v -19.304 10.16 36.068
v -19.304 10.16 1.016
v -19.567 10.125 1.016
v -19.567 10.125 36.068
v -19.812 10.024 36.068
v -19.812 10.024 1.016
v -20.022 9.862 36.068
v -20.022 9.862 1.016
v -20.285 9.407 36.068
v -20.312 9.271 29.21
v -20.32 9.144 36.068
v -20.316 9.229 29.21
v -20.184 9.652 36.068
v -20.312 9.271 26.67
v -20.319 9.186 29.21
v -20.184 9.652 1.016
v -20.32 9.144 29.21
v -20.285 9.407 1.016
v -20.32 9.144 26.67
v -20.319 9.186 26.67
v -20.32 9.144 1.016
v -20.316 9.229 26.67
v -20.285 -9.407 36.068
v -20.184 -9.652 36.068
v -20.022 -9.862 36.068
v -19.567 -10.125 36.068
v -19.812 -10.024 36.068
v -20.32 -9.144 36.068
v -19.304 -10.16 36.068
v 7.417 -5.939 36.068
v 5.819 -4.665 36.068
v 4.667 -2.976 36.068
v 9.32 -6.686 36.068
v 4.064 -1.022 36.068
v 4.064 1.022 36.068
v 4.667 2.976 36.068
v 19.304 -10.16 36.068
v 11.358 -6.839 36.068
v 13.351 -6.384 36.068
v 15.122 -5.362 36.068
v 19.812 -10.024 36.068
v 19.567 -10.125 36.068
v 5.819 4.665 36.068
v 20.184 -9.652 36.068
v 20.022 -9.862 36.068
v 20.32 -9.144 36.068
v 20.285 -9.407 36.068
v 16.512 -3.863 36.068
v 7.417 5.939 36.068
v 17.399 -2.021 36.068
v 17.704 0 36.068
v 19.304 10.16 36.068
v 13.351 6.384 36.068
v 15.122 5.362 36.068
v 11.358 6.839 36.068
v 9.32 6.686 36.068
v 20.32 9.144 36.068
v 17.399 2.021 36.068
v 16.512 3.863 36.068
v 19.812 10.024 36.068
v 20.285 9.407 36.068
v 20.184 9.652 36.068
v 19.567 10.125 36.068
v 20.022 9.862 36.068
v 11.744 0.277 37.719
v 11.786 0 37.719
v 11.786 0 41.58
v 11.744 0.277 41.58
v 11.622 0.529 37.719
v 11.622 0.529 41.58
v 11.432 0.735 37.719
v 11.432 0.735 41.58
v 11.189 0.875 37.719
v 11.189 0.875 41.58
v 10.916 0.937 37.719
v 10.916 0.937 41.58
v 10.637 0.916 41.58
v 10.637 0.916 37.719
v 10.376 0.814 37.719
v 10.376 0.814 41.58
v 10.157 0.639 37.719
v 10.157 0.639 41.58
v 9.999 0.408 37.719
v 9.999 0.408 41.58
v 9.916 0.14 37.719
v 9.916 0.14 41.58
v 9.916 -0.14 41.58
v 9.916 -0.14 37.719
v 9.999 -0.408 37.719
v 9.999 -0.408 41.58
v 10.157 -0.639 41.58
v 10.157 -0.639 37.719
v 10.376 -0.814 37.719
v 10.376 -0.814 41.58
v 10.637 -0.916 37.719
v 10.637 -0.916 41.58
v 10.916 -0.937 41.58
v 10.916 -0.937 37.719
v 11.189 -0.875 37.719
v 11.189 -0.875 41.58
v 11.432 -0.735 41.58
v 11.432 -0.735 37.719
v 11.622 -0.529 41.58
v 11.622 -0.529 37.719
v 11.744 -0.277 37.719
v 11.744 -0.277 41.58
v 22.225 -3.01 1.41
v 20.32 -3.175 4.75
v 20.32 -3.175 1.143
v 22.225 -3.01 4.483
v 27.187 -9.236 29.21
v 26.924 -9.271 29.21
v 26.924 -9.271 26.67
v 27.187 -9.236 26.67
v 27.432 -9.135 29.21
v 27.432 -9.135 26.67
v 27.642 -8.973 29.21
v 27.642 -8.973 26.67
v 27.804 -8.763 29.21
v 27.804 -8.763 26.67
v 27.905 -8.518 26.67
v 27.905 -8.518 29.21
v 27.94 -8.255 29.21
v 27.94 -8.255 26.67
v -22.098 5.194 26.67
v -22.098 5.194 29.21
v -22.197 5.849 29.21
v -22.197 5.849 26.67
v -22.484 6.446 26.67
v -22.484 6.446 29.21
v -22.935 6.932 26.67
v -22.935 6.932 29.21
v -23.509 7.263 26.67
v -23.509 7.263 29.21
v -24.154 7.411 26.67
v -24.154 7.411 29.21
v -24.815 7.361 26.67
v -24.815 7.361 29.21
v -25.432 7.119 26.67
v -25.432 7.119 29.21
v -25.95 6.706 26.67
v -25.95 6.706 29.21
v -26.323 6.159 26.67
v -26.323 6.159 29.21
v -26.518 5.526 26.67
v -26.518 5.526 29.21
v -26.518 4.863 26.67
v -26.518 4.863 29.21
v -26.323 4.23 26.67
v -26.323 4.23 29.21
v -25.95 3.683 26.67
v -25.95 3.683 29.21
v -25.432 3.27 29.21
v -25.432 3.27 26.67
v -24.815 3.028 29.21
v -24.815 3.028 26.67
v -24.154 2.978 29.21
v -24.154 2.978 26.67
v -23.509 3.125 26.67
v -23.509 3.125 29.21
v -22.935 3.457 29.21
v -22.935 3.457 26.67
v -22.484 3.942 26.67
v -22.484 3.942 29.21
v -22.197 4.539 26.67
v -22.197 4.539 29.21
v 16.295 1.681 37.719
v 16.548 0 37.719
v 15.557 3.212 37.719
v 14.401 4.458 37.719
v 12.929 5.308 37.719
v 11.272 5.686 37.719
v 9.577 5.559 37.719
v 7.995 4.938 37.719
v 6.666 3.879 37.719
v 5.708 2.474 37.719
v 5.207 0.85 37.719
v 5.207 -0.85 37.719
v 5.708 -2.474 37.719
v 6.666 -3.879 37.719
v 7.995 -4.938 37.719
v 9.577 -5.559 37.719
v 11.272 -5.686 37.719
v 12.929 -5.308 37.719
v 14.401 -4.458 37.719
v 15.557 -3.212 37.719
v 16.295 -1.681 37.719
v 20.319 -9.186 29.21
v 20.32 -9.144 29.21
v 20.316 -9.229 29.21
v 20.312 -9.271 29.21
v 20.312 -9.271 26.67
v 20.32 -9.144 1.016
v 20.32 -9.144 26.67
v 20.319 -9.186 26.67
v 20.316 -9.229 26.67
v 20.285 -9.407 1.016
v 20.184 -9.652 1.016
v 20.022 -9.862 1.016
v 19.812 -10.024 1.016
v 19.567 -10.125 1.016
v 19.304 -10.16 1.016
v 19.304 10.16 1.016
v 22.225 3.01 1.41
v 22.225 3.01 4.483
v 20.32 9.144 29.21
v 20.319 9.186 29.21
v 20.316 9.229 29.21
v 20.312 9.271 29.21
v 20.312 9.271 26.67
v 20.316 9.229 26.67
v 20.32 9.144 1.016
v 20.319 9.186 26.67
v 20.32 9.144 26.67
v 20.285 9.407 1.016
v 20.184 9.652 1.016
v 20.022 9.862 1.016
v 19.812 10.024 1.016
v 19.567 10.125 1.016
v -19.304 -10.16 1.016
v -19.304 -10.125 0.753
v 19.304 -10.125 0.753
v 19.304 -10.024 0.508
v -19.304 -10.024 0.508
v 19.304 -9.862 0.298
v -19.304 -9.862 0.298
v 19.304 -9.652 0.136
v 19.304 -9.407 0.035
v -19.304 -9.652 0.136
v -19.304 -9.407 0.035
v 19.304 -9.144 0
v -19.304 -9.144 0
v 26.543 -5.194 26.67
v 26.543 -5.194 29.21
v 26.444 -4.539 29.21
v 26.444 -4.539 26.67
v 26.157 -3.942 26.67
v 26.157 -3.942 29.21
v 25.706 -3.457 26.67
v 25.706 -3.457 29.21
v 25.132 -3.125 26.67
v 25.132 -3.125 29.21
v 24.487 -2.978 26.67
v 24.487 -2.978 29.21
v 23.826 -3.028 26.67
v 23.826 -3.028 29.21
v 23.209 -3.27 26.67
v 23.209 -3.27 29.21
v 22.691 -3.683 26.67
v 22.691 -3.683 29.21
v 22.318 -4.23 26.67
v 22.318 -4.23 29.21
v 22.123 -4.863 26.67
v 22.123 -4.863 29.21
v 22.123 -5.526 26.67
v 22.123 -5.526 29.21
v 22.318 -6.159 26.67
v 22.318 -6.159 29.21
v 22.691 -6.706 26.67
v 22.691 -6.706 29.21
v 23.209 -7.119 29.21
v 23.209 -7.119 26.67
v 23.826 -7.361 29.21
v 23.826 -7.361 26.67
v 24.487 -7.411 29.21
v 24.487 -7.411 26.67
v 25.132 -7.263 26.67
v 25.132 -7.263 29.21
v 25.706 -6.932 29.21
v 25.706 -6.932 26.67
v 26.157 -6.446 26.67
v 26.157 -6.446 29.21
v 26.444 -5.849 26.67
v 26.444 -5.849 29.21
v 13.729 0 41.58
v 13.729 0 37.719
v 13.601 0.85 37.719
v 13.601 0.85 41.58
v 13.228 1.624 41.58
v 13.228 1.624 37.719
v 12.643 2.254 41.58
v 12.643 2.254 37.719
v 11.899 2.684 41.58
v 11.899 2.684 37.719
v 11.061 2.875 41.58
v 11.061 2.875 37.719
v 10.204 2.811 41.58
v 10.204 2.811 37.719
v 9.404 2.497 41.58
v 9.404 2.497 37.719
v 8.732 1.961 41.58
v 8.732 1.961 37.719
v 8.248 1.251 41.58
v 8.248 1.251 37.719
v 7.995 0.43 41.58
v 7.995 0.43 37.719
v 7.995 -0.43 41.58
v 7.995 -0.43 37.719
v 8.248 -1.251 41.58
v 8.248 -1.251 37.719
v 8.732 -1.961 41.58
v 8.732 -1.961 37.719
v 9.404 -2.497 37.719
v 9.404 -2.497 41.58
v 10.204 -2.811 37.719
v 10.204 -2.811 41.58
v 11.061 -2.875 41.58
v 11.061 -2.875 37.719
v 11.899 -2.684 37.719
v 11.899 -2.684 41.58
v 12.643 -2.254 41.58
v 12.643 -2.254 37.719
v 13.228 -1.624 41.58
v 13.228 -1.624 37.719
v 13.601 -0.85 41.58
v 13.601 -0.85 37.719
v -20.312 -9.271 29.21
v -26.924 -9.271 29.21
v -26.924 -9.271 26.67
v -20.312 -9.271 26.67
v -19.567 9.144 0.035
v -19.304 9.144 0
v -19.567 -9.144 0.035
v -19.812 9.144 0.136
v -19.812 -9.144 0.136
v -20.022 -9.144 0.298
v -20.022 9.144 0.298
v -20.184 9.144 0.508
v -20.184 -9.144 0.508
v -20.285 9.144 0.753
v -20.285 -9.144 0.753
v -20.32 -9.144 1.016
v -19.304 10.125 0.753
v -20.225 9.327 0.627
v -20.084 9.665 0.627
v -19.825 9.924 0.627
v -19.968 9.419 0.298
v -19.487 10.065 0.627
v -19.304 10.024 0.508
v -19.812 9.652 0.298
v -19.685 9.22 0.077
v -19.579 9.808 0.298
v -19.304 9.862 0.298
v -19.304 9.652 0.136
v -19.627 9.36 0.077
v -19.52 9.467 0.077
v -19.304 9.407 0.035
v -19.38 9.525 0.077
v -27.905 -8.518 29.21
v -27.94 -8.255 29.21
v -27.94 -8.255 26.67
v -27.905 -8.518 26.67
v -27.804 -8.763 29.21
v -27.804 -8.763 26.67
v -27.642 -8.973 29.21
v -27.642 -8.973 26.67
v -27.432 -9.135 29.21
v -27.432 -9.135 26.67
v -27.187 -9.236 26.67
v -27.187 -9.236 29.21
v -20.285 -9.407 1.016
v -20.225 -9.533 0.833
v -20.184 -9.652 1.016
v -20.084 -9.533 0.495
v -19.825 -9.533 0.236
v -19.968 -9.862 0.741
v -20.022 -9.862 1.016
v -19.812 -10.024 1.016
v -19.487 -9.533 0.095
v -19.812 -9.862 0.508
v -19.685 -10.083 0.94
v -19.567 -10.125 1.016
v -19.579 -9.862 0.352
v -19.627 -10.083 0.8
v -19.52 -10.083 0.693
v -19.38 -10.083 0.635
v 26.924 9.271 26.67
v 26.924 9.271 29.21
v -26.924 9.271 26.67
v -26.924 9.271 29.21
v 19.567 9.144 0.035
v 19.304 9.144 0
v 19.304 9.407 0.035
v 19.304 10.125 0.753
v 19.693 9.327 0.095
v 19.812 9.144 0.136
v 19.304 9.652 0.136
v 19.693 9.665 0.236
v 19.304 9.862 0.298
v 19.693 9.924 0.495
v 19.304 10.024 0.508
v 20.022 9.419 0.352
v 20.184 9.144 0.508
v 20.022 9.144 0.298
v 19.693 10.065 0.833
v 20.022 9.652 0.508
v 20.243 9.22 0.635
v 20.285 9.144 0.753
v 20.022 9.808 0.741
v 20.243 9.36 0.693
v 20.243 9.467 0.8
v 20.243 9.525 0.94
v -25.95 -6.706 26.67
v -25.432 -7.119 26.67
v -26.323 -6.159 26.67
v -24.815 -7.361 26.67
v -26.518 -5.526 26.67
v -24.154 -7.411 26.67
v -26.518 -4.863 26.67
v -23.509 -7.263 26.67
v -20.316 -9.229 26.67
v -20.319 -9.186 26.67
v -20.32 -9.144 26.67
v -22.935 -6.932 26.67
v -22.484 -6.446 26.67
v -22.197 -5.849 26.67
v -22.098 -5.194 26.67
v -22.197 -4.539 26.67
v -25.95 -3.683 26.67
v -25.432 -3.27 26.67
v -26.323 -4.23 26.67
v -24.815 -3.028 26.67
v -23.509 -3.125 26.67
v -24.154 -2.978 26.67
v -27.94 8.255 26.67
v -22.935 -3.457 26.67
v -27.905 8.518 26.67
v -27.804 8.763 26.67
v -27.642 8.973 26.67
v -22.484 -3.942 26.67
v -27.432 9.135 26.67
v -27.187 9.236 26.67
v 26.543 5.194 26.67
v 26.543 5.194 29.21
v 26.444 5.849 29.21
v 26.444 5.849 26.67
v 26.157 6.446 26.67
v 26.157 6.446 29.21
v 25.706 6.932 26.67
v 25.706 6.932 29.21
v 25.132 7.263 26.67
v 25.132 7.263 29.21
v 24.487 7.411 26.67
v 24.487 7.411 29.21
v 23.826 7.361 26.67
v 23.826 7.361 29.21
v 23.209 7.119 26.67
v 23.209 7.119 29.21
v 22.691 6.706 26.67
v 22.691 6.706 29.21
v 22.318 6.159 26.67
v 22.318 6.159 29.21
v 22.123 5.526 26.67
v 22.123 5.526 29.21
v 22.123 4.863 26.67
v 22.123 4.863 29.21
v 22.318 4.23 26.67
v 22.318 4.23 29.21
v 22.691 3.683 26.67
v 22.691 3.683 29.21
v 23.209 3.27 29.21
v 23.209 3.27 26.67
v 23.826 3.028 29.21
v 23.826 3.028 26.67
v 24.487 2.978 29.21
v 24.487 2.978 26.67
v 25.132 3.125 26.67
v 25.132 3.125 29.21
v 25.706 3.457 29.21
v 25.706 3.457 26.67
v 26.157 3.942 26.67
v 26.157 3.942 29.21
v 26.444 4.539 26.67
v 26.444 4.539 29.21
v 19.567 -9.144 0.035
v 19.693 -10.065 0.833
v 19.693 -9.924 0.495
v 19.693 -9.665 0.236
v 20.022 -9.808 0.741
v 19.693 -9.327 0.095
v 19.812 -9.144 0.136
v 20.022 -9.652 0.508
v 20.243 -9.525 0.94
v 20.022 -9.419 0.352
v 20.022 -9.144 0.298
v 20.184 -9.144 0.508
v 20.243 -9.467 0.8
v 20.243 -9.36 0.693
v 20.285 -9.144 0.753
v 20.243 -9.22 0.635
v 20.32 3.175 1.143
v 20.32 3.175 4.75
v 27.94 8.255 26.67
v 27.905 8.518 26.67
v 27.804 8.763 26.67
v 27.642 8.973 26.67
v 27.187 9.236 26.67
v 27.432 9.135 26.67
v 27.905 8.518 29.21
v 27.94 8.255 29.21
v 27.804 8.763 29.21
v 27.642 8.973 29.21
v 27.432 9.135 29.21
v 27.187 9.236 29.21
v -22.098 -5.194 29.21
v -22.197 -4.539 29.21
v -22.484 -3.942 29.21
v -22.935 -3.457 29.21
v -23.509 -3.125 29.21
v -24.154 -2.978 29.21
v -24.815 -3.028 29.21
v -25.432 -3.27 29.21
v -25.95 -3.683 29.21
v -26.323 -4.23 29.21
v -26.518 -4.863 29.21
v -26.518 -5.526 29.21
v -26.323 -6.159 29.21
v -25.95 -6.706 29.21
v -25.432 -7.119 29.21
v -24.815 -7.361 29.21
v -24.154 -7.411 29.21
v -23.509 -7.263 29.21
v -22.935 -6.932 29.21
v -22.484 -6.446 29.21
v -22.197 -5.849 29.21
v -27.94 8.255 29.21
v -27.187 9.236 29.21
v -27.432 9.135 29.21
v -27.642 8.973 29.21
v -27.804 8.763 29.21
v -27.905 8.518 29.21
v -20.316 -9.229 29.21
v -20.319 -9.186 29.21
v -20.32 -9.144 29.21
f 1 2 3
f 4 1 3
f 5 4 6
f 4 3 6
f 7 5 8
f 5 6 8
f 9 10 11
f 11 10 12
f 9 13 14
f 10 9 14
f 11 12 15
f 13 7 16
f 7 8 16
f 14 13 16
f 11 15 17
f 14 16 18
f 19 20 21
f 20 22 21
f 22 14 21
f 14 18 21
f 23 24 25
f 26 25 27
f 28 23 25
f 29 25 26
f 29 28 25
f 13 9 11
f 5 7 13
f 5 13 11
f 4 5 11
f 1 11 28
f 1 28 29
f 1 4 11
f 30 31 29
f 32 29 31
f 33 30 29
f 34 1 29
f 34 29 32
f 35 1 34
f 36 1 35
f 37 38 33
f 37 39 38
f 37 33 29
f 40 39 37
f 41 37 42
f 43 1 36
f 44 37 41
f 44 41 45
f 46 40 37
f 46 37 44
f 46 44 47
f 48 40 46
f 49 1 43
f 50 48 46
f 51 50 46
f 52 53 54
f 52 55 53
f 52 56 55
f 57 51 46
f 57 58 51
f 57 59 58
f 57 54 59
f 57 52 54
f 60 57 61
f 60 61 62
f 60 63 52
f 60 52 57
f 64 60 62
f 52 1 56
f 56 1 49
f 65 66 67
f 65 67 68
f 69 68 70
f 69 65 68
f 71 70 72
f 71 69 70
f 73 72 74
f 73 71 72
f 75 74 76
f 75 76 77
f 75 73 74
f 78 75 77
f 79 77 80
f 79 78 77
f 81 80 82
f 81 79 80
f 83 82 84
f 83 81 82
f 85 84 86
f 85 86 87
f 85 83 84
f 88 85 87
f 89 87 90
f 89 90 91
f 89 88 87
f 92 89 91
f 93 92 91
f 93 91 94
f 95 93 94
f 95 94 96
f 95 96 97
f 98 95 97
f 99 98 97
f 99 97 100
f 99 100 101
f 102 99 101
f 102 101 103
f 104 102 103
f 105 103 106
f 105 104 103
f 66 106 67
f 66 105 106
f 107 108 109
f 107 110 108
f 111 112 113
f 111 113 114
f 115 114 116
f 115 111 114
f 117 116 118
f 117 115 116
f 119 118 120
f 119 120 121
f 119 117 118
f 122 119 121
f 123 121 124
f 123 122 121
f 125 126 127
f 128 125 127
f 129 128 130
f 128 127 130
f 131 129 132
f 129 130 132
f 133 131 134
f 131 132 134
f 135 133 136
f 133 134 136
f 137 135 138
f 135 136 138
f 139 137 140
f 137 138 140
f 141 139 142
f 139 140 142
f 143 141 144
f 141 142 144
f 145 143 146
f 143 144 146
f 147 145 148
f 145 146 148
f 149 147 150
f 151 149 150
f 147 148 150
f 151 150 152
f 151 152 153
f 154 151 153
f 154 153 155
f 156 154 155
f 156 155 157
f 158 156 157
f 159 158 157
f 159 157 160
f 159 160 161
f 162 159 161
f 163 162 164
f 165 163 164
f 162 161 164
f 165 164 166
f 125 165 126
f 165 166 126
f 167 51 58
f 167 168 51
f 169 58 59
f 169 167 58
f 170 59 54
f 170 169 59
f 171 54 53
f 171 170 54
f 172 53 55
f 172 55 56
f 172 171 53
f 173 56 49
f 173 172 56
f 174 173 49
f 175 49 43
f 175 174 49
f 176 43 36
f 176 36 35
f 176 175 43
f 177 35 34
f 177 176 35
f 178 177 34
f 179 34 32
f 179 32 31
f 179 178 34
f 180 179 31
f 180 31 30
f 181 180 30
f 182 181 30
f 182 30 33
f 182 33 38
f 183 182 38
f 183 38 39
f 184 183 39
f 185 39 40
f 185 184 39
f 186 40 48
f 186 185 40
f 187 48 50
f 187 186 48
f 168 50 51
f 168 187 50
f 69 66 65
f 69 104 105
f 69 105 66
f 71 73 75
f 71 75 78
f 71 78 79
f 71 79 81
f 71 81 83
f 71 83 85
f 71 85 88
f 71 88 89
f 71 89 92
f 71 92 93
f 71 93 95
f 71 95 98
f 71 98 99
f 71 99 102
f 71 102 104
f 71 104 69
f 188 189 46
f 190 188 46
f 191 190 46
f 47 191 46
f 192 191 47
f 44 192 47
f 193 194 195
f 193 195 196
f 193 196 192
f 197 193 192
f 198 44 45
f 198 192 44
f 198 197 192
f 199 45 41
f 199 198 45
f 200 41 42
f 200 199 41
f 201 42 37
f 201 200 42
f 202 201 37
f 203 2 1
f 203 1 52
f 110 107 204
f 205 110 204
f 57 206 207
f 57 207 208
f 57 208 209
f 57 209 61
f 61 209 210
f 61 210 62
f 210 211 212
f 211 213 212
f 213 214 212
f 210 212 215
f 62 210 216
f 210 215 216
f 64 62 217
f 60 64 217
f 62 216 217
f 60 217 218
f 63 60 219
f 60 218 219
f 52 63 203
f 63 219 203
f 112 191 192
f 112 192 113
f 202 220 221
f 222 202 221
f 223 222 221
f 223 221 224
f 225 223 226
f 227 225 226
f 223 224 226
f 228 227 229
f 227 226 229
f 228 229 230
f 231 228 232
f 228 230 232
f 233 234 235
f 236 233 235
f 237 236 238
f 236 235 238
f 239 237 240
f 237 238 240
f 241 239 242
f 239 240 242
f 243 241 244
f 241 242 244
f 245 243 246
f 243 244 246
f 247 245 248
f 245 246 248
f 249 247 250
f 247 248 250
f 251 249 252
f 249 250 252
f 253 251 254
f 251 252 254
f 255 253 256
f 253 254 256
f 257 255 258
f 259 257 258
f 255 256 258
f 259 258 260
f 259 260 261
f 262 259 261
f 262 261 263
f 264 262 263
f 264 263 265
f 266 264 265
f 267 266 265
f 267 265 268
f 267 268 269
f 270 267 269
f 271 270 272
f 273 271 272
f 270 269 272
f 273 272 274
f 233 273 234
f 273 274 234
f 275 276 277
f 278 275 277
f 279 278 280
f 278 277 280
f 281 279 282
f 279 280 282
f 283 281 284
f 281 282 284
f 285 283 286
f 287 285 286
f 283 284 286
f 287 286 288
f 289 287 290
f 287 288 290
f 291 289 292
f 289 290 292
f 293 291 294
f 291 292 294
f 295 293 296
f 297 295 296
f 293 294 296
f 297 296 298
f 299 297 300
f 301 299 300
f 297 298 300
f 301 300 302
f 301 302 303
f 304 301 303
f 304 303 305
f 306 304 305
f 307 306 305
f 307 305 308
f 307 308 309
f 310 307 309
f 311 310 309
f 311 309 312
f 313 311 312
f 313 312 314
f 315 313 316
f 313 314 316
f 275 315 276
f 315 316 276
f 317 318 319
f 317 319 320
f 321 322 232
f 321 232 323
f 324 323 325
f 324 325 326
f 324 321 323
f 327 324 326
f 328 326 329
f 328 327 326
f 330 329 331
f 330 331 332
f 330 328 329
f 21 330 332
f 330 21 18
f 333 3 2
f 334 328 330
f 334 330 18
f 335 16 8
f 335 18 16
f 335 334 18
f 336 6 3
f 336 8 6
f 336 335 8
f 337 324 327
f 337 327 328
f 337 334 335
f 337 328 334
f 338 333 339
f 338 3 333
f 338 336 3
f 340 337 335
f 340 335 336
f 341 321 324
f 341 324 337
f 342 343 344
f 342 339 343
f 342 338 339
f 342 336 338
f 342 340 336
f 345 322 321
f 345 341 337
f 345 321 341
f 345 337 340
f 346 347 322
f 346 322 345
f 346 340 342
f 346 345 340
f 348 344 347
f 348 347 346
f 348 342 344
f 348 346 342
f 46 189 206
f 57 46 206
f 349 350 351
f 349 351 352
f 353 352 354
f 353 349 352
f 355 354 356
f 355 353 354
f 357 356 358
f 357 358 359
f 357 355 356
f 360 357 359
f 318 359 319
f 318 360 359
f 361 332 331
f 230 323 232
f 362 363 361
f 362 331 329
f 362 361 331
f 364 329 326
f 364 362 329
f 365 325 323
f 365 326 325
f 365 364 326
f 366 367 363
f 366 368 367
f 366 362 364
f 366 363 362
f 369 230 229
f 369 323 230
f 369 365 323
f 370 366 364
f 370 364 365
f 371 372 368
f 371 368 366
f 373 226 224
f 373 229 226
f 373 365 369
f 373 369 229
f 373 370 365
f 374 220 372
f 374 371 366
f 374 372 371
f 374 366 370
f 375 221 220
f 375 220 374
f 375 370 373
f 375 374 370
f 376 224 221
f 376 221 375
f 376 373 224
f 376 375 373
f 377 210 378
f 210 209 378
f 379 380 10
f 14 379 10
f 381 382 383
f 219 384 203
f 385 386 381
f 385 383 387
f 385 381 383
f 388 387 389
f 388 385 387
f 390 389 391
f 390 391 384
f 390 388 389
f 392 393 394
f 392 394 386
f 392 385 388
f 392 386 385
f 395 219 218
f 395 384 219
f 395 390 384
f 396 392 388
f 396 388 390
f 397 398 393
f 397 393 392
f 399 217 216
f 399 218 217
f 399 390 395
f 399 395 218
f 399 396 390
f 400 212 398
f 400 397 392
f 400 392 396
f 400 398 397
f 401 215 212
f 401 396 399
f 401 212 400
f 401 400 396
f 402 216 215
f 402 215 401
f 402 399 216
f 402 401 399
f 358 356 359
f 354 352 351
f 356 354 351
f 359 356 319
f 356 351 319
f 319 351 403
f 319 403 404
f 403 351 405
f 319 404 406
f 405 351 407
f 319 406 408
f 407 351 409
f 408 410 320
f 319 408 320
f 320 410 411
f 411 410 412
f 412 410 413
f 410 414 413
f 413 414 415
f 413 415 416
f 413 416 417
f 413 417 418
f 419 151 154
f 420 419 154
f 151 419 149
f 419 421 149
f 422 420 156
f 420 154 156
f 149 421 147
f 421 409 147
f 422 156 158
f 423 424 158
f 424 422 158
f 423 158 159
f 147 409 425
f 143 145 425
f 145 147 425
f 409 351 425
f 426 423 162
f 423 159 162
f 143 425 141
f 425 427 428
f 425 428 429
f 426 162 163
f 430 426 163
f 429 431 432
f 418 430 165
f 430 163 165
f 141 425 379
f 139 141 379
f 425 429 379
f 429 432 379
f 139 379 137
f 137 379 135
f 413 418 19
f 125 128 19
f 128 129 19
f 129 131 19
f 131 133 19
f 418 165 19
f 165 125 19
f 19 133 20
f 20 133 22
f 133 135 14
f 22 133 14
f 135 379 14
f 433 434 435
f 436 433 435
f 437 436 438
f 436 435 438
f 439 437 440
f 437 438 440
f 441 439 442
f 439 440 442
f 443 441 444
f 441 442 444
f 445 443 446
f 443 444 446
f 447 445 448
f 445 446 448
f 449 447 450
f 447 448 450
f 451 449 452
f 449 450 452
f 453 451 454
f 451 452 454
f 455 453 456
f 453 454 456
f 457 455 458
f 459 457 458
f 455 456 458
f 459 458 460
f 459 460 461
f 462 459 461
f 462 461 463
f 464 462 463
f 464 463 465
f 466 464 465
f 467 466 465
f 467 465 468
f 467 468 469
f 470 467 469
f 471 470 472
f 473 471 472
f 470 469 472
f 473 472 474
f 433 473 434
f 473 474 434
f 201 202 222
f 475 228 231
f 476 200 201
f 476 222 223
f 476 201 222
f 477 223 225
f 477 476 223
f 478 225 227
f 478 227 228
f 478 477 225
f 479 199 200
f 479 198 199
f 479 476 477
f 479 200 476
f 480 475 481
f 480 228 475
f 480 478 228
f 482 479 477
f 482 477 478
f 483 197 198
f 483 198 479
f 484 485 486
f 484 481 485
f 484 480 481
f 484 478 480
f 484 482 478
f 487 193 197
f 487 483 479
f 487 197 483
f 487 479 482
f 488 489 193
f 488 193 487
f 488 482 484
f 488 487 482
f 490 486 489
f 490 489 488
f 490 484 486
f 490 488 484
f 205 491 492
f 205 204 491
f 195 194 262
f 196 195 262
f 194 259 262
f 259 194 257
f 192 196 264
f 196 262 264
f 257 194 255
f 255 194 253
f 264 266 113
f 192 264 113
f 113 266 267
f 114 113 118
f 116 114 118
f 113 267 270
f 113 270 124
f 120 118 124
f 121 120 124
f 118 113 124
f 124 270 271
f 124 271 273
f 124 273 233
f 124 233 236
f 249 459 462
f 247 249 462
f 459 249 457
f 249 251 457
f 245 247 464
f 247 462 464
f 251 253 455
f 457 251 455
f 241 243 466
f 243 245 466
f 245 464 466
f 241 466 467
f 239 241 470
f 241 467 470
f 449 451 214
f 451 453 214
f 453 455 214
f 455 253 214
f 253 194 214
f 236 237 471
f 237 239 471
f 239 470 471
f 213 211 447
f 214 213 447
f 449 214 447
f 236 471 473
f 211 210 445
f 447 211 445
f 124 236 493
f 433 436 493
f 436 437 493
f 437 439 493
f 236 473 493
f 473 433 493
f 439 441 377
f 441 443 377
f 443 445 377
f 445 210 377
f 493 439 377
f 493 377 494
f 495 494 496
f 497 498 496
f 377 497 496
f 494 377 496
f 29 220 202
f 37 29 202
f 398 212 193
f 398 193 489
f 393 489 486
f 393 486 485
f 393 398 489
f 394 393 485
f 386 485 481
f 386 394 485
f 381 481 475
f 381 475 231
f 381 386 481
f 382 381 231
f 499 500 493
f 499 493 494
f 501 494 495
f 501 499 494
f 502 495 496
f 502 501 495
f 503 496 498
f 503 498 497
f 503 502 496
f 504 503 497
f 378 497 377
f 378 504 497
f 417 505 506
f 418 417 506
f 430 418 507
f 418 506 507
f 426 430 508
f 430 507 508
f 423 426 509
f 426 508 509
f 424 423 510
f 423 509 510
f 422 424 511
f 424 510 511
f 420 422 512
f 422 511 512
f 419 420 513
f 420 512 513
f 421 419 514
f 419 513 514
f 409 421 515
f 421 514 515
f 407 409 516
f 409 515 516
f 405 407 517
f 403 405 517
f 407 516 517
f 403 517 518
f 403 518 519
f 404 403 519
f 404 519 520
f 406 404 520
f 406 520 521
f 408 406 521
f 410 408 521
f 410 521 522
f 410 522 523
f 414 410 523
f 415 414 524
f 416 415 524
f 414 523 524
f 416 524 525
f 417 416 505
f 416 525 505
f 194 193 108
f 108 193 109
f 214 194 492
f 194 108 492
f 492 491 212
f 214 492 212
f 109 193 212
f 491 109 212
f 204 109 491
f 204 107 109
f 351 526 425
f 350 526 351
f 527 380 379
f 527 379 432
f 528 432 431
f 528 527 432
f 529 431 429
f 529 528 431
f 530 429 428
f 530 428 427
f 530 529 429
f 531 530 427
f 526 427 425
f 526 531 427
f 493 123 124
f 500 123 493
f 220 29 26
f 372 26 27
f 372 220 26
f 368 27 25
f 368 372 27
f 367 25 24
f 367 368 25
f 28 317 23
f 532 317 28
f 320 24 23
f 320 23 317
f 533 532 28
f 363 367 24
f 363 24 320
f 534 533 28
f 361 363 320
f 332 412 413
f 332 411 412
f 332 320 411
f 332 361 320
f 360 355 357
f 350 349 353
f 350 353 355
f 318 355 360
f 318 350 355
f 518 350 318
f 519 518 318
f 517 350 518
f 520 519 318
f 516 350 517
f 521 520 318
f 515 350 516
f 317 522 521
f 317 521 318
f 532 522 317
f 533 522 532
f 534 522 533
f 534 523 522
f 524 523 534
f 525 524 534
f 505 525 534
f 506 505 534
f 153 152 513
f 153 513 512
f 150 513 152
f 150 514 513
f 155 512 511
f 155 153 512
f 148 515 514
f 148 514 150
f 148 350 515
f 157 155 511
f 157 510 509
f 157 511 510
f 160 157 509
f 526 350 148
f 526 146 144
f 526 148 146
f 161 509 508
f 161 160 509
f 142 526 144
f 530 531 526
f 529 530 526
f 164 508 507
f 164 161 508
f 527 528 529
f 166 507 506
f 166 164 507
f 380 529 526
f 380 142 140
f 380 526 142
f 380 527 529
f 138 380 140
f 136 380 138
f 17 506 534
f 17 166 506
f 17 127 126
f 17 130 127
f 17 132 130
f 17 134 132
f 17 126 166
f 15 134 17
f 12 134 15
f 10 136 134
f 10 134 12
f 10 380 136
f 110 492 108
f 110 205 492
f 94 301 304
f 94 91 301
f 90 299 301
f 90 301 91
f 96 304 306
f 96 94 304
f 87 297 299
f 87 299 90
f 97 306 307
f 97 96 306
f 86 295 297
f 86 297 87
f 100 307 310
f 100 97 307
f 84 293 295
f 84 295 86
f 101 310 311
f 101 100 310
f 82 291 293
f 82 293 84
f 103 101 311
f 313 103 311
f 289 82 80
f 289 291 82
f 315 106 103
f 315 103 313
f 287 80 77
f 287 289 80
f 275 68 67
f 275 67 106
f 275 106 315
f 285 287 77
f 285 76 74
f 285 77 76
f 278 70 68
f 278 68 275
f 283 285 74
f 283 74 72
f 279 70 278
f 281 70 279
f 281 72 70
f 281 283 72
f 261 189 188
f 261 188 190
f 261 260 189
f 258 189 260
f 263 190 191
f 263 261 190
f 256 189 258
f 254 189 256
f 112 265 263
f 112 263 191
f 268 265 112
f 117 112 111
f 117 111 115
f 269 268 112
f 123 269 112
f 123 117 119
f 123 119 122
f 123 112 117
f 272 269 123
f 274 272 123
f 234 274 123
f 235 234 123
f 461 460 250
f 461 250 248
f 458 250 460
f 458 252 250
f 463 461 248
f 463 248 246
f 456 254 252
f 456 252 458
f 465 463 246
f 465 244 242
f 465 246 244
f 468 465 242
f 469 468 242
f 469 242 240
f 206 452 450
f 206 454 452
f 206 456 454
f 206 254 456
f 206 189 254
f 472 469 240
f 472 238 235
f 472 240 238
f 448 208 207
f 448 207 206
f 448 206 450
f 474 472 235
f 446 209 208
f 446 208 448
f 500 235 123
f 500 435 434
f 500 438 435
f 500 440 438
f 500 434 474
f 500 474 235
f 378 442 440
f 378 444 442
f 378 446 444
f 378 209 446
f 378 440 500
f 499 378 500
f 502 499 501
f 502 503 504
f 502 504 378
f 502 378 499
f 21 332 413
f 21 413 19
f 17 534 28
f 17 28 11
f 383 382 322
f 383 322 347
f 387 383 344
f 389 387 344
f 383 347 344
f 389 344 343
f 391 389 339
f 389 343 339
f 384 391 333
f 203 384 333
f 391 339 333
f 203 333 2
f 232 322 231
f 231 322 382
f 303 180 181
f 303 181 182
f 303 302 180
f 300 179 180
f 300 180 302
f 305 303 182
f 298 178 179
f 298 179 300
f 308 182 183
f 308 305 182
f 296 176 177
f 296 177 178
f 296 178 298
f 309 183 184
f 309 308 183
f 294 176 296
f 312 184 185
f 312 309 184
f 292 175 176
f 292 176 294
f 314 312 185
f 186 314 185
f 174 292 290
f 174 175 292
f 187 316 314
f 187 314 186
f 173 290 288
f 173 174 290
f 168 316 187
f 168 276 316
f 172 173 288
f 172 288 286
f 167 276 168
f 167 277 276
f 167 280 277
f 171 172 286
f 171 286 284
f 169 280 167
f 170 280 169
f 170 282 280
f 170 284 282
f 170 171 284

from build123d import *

# Parameters (mm, degrees)
F0_W           = 40.64
F0_H           = 20.32
F1_DEPTH       = 36.068
F2_W           = 6.35
F2_H           = 3.6068
F4_W           = 6.0198
F4_H           = 3.0734
F7_R           = 2.2225
F8_DEPTH       = 2.54
F9_R           = 6.858
F11_R          = 5.7023
F13_T1_DEPTH   = 38.608
F13_T3_DEPTH   = 18.288
F13_S7_W       = 1.016
F13_S7_H       = 1.016
F13_T8_DEPTH   = 1.016
F13_S13_W      = 1.016
F13_S13_H      = 1.016
F13_T14_DEPTH  = 1.016
F13_S19_W      = 1.016
F13_S19_H      = 1.016
F13_T20_DEPTH  = 1.016
F13_S25_W      = 1.016
F13_S25_H      = 1.016
F13_T26_DEPTH  = 1.016
F13_T32_DEPTH  = 37.592
F13_T38_DEPTH  = 37.592
F13_T44_DEPTH  = 37.592
F13_T51_DEPTH  = 37.592
F13_T57_DEPTH  = 37.592
F13_T63_DEPTH  = 37.592
F13_T69_DEPTH  = 37.592
F13_T75_DEPTH  = 37.592
F13_T82_DEPTH  = 37.592
F13_T88_DEPTH  = 37.592
F13_T94_DEPTH  = 37.592
F13_T100_DEPTH = 37.592
F13_T106_DEPTH = 37.592
F13_T113_DEPTH = 37.592
F13_T119_DEPTH = 37.592
F13_T125_DEPTH = 37.592
F13_T131_DEPTH = 37.592
F13_T137_DEPTH = 37.592
F13_T144_DEPTH = 37.592
F13_T150_DEPTH = 37.592
F14_R          = 2.8829
F14_R_2        = 0.9398
F15_DEPTH      = 3.8608


# Not quite as in the source:
# - a fillet or chamfer that OpenCascade refuses, or shapes differently, is made with other operations: its cross-section is extruded or revolved along the edge and cut away or added


with BuildPart() as f1:
    # F0 (on Top) → F1 (new body)
    with BuildSketch(Plane.XY):
        Rectangle(F0_W, F0_H)
    extrude(amount=F1_DEPTH)

    # F2 (on face) → F5 section 0
    with BuildSketch(Plane.YZ.offset(20.32)):
        with Locations((0, 2.9464)):
            Rectangle(F2_W, F2_H)
    # F4 (on offset) → F5 section 1
    with BuildSketch(Plane.YZ.offset(22.225)):
        with Locations((0, 2.9464)):
            Rectangle(F4_W, F4_H)
    loft()

    # F7 (on offset) → F8 (join)
    with BuildSketch(Plane.XY.offset(29.21)):
        with BuildLine():
            ThreePointArc((-27.94, -8.255), (-27.6424204897, -8.9734204897), (-26.924, -9.271))
            Line((-26.924, -9.271), (-20.32, -9.271))
            Line((-20.32, -9.271), (-20.32, 9.271))
            Line((-20.32, 9.271), (-26.924, 9.271))
            ThreePointArc((-26.924, 9.271), (-27.6424204897, 8.9734204897), (-27.94, 8.255))
            Line((-27.94, 8.255), (-27.94, -8.255))
        make_face()
        with Locations((-24.3205, -5.1943)):
            Circle(F7_R, mode=Mode.SUBTRACT)
        with Locations((-24.3205, 5.1943)):
            Circle(F7_R, mode=Mode.SUBTRACT)
        with BuildLine():
            ThreePointArc((27.94, 8.255), (27.6424204897, 8.9734204897), (26.924, 9.271))
            Line((26.924, 9.271), (20.32, 9.271))
            Line((20.32, 9.271), (20.32, -9.271))
            Line((20.32, -9.271), (26.924, -9.271))
            ThreePointArc((26.924, -9.271), (27.6424204897, -8.9734204897), (27.94, -8.255))
            Line((27.94, -8.255), (27.94, 8.255))
        make_face()
        with Locations((24.3205, -5.1943)):
            Circle(F7_R, mode=Mode.SUBTRACT)
        with Locations((24.3205, 5.1943)):
            Circle(F7_R, mode=Mode.SUBTRACT)
    extrude(amount=-F8_DEPTH)

    # F9 (on face) → F12 section 0
    with BuildSketch(Plane.XY.offset(36.068)):
        with Locations((10.8458, 0)):
            Circle(F9_R)
    # F11 (on offset) → F12 section 1
    with BuildSketch(Plane.XY.offset(37.719)):
        with Locations((10.8458, 0)):
            Circle(F11_R)
    loft()

    # F13: fillet of radius 1.016 on 8 edges, made by hand

    # F13_s2 → F13_t1 (cut)
    with BuildSketch(Plane.YZ.offset(-19.304)):
        with BuildLine():
            ThreePointArc((-10.16, 1.016), (-9.8624204897, 0.2975795103), (-9.144, 0))
            Line((-9.144, 0), (-10.16, 0))
            Line((-10.16, 0), (-10.16, 1.016))
        make_face()
        with BuildLine():
            ThreePointArc((9.144, 0), (9.8624204897, 0.2975795103), (10.16, 1.016))
            Line((10.16, 1.016), (10.16, 0))
            Line((10.16, 0), (9.144, 0))
        make_face()
    extrude(amount=F13_T1_DEPTH, mode=Mode.SUBTRACT)

    # F13_s4 → F13_t3 (cut)
    with BuildSketch(Plane.XZ.offset(-9.144)):
        with BuildLine():
            ThreePointArc((20.32, 1.016), (20.0224204897, 0.2975795103), (19.304, 0))
            Line((19.304, 0), (20.32, 0))
            Line((20.32, 0), (20.32, 1.016))
        make_face()
        with BuildLine():
            ThreePointArc((-19.304, 0), (-20.0224204897, 0.2975795103), (-20.32, 1.016))
            Line((-20.32, 1.016), (-20.32, 0))
            Line((-20.32, 0), (-19.304, 0))
        make_face()
    extrude(amount=F13_T3_DEPTH, mode=Mode.SUBTRACT)


with BuildPart() as f13_tool6:
    # F13_s7 → F13_t8 (new body)
    with BuildSketch(Plane.YZ.offset(19.304)):
        with Locations((-9.652, 0.508)):
            Rectangle(F13_S7_W, F13_S7_H)
    extrude(amount=F13_T8_DEPTH)

    # F13_s9 → F13_t10 (revolve, cut)
    with BuildSketch(Plane(origin=(19.304, -9.144, 1.016), x_dir=(0, 0.7071067812, 0.7071067812), z_dir=(0, 0.7071067812, -0.7071067812))):
        with BuildLine():
            ThreePointArc((0, -1.016), (1.016, 0), (0, 1.016))
            Line((0, 1.016), (0, -1.016))
        make_face()
    revolve(axis=Axis((19.304, -9.144, 1.016), (1, 0, 0)), mode=Mode.SUBTRACT)


with BuildPart() as f1_1:
    add(f1.part)

    # F13_t5: cut F13_tool6
    add(f13_tool6.part, mode=Mode.SUBTRACT)


with BuildPart() as f13_tool12:
    # F13_s13 → F13_t14 (new body)
    with BuildSketch(Plane.YZ.offset(19.304)):
        with Locations((9.652, 0.508)):
            Rectangle(F13_S13_W, F13_S13_H)
    extrude(amount=F13_T14_DEPTH)

    # F13_s15 → F13_t16 (revolve, cut)
    with BuildSketch(Plane(origin=(19.304, 9.144, 1.016), x_dir=(0, -0.7071067812, 0.7071067812), z_dir=(0, 0.7071067812, 0.7071067812))):
        with BuildLine():
            ThreePointArc((0, -1.016), (1.016, 0), (0, 1.016))
            Line((0, 1.016), (0, -1.016))
        make_face()
    revolve(axis=Axis((19.304, 9.144, 1.016), (1, 0, 0)), mode=Mode.SUBTRACT)


with BuildPart() as f1_2:
    add(f1_1.part)

    # F13_t11: cut F13_tool12
    add(f13_tool12.part, mode=Mode.SUBTRACT)


with BuildPart() as f13_tool18:
    # F13_s19 → F13_t20 (new body)
    with BuildSketch(Plane.XY.offset(1.016)):
        with Locations((-19.812, 9.652)):
            Rectangle(F13_S19_W, F13_S19_H)
    extrude(amount=-F13_T20_DEPTH)

    # F13_s21 → F13_t22 (revolve, cut)
    with BuildSketch(Plane(origin=(-19.304, 9.144, 1.016), x_dir=(0.7071067812, -0.7071067812, 0), z_dir=(0.7071067812, 0.7071067812, 0))):
        with BuildLine():
            ThreePointArc((0, -1.016), (1.016, 0), (0, 1.016))
            Line((0, 1.016), (0, -1.016))
        make_face()
    revolve(axis=Axis((-19.304, 9.144, 1.016), (0, 0, -1)), mode=Mode.SUBTRACT)


with BuildPart() as f1_3:
    add(f1_2.part)

    # F13_t17: cut F13_tool18
    add(f13_tool18.part, mode=Mode.SUBTRACT)


with BuildPart() as f13_tool24:
    # F13_s25 → F13_t26 (new body)
    with BuildSketch(Plane.XZ.offset(9.144)):
        with Locations((-19.812, 0.508)):
            Rectangle(F13_S25_W, F13_S25_H)
    extrude(amount=F13_T26_DEPTH)

    # F13_s27 → F13_t28 (revolve, cut)
    with BuildSketch(Plane(origin=(-19.304, -9.144, 1.016), x_dir=(0.7071067812, 0, 0.7071067812), z_dir=(0.7071067812, 0, -0.7071067812))):
        with BuildLine():
            ThreePointArc((0, -1.016), (1.016, 0), (0, 1.016))
            Line((0, 1.016), (0, -1.016))
        make_face()
    revolve(axis=Axis((-19.304, -9.144, 1.016), (0, -1, 0)), mode=Mode.SUBTRACT)


with BuildPart() as f1_4:
    add(f1_3.part)

    # F13_t23: cut F13_tool24
    add(f13_tool24.part, mode=Mode.SUBTRACT)


with BuildPart() as f13_tool30:
    # F13_s31 → F13_t32 (new body)
    with BuildSketch(Plane.XY.offset(1.016)):
        with BuildLine():
            ThreePointArc((20.32, -9.144), (20.0224204897, -9.8624204897), (19.304, -10.16))
            Line((19.304, -10.16), (20.32, -10.16))
            Line((20.32, -10.16), (20.32, -9.144))
        make_face()
    extrude(amount=F13_T32_DEPTH)

    split(bisect_by=Plane.XY.offset(26.67), keep=Keep.BOTTOM)

    split(bisect_by=Plane.XZ.offset(9.271), keep=Keep.BOTTOM)


with BuildPart() as f1_5:
    add(f1_4.part)

    # F13_t29: cut F13_tool30
    add(f13_tool30.part, mode=Mode.SUBTRACT)


with BuildPart() as f13_tool36:
    # F13_s37 → F13_t38 (new body)
    with BuildSketch(Plane.XY.offset(1.016)):
        with BuildLine():
            ThreePointArc((20.32, -9.144), (20.0224204897, -9.8624204897), (19.304, -10.16))
            Line((19.304, -10.16), (20.32, -10.16))
            Line((20.32, -10.16), (20.32, -9.144))
        make_face()
    extrude(amount=F13_T38_DEPTH)

    split(bisect_by=Plane.XY.offset(26.67), keep=Keep.BOTTOM)

    split(bisect_by=Plane.XZ.offset(9.271), keep=Keep.TOP)


with BuildPart() as f1_6:
    add(f1_5.part)

    # F13_t35: cut F13_tool36
    add(f13_tool36.part, mode=Mode.SUBTRACT)


with BuildPart() as f13_tool42:
    # F13_s43 → F13_t44 (new body)
    with BuildSketch(Plane.XY.offset(1.016)):
        with BuildLine():
            ThreePointArc((20.32, -9.144), (20.0224204897, -9.8624204897), (19.304, -10.16))
            Line((19.304, -10.16), (20.32, -10.16))
            Line((20.32, -10.16), (20.32, -9.144))
        make_face()
    extrude(amount=F13_T44_DEPTH)

    split(bisect_by=Plane.XY.offset(26.67), keep=Keep.TOP)

    split(bisect_by=Plane.XZ.offset(9.271), keep=Keep.TOP)

    split(bisect_by=Plane.XY.offset(29.21), keep=Keep.BOTTOM)


with BuildPart() as f1_7:
    add(f1_6.part)

    # F13_t41: cut F13_tool42
    add(f13_tool42.part, mode=Mode.SUBTRACT)


with BuildPart() as f13_tool49:
    # F13_s50 → F13_t51 (new body)
    with BuildSketch(Plane.XY.offset(1.016)):
        with BuildLine():
            ThreePointArc((20.32, -9.144), (20.0224204897, -9.8624204897), (19.304, -10.16))
            Line((19.304, -10.16), (20.32, -10.16))
            Line((20.32, -10.16), (20.32, -9.144))
        make_face()
    extrude(amount=F13_T51_DEPTH)

    split(bisect_by=Plane.XZ.offset(9.271), keep=Keep.BOTTOM)

    split(bisect_by=Plane.XY.offset(29.21), keep=Keep.TOP)


with BuildPart() as f1_8:
    add(f1_7.part)

    # F13_t48: cut F13_tool49
    add(f13_tool49.part, mode=Mode.SUBTRACT)


with BuildPart() as f13_tool55:
    # F13_s56 → F13_t57 (new body)
    with BuildSketch(Plane.XY.offset(1.016)):
        with BuildLine():
            ThreePointArc((20.32, -9.144), (20.0224204897, -9.8624204897), (19.304, -10.16))
            Line((19.304, -10.16), (20.32, -10.16))
            Line((20.32, -10.16), (20.32, -9.144))
        make_face()
    extrude(amount=F13_T57_DEPTH)

    split(bisect_by=Plane.XZ.offset(9.271), keep=Keep.TOP)

    split(bisect_by=Plane.XY.offset(29.21), keep=Keep.TOP)


with BuildPart() as f1_9:
    add(f1_8.part)

    # F13_t54: cut F13_tool55
    add(f13_tool55.part, mode=Mode.SUBTRACT)


with BuildPart() as f13_tool61:
    # F13_s62 → F13_t63 (new body)
    with BuildSketch(Plane.XY.offset(1.016)):
        with BuildLine():
            ThreePointArc((20.32, 9.144), (20.0224204897, 9.8624204897), (19.304, 10.16))
            Line((19.304, 10.16), (20.32, 10.16))
            Line((20.32, 10.16), (20.32, 9.144))
        make_face()
    extrude(amount=F13_T63_DEPTH)

    split(bisect_by=Plane.XZ.offset(-9.271), keep=Keep.TOP)

    split(bisect_by=Plane.XY.offset(26.67), keep=Keep.BOTTOM)


with BuildPart() as f1_10:
    add(f1_9.part)

    # F13_t60: cut F13_tool61
    add(f13_tool61.part, mode=Mode.SUBTRACT)


with BuildPart() as f13_tool67:
    # F13_s68 → F13_t69 (new body)
    with BuildSketch(Plane.XY.offset(1.016)):
        with BuildLine():
            ThreePointArc((20.32, 9.144), (20.0224204897, 9.8624204897), (19.304, 10.16))
            Line((19.304, 10.16), (20.32, 10.16))
            Line((20.32, 10.16), (20.32, 9.144))
        make_face()
    extrude(amount=F13_T69_DEPTH)

    split(bisect_by=Plane.XZ.offset(-9.271), keep=Keep.BOTTOM)

    split(bisect_by=Plane.XY.offset(26.67), keep=Keep.BOTTOM)


with BuildPart() as f1_11:
    add(f1_10.part)

    # F13_t66: cut F13_tool67
    add(f13_tool67.part, mode=Mode.SUBTRACT)


with BuildPart() as f13_tool73:
    # F13_s74 → F13_t75 (new body)
    with BuildSketch(Plane.XY.offset(1.016)):
        with BuildLine():
            ThreePointArc((20.32, 9.144), (20.0224204897, 9.8624204897), (19.304, 10.16))
            Line((19.304, 10.16), (20.32, 10.16))
            Line((20.32, 10.16), (20.32, 9.144))
        make_face()
    extrude(amount=F13_T75_DEPTH)

    split(bisect_by=Plane.XZ.offset(-9.271), keep=Keep.BOTTOM)

    split(bisect_by=Plane.XY.offset(26.67), keep=Keep.TOP)

    split(bisect_by=Plane.XY.offset(29.21), keep=Keep.BOTTOM)


with BuildPart() as f1_12:
    add(f1_11.part)

    # F13_t72: cut F13_tool73
    add(f13_tool73.part, mode=Mode.SUBTRACT)


with BuildPart() as f13_tool80:
    # F13_s81 → F13_t82 (new body)
    with BuildSketch(Plane.XY.offset(1.016)):
        with BuildLine():
            ThreePointArc((20.32, 9.144), (20.0224204897, 9.8624204897), (19.304, 10.16))
            Line((19.304, 10.16), (20.32, 10.16))
            Line((20.32, 10.16), (20.32, 9.144))
        make_face()
    extrude(amount=F13_T82_DEPTH)

    split(bisect_by=Plane.XZ.offset(-9.271), keep=Keep.TOP)

    split(bisect_by=Plane.XY.offset(29.21), keep=Keep.TOP)


with BuildPart() as f1_13:
    add(f1_12.part)

    # F13_t79: cut F13_tool80
    add(f13_tool80.part, mode=Mode.SUBTRACT)


with BuildPart() as f13_tool86:
    # F13_s87 → F13_t88 (new body)
    with BuildSketch(Plane.XY.offset(1.016)):
        with BuildLine():
            ThreePointArc((20.32, 9.144), (20.0224204897, 9.8624204897), (19.304, 10.16))
            Line((19.304, 10.16), (20.32, 10.16))
            Line((20.32, 10.16), (20.32, 9.144))
        make_face()
    extrude(amount=F13_T88_DEPTH)

    split(bisect_by=Plane.XZ.offset(-9.271), keep=Keep.BOTTOM)

    split(bisect_by=Plane.XY.offset(29.21), keep=Keep.TOP)


with BuildPart() as f1_14:
    add(f1_13.part)

    # F13_t85: cut F13_tool86
    add(f13_tool86.part, mode=Mode.SUBTRACT)


with BuildPart() as f13_tool92:
    # F13_s93 → F13_t94 (new body)
    with BuildSketch(Plane.XY.offset(1.016)):
        with BuildLine():
            ThreePointArc((-19.304, 10.16), (-20.0224204897, 9.8624204897), (-20.32, 9.144))
            Line((-20.32, 9.144), (-20.32, 10.16))
            Line((-20.32, 10.16), (-19.304, 10.16))
        make_face()
    extrude(amount=F13_T94_DEPTH)

    split(bisect_by=Plane.XY.offset(26.67), keep=Keep.BOTTOM)

    split(bisect_by=Plane.XZ.offset(-9.271), keep=Keep.BOTTOM)


with BuildPart() as f1_15:
    add(f1_14.part)

    # F13_t91: cut F13_tool92
    add(f13_tool92.part, mode=Mode.SUBTRACT)


with BuildPart() as f13_tool98:
    # F13_s99 → F13_t100 (new body)
    with BuildSketch(Plane.XY.offset(1.016)):
        with BuildLine():
            ThreePointArc((-19.304, 10.16), (-20.0224204897, 9.8624204897), (-20.32, 9.144))
            Line((-20.32, 9.144), (-20.32, 10.16))
            Line((-20.32, 10.16), (-19.304, 10.16))
        make_face()
    extrude(amount=F13_T100_DEPTH)

    split(bisect_by=Plane.XY.offset(26.67), keep=Keep.BOTTOM)

    split(bisect_by=Plane.XZ.offset(-9.271), keep=Keep.TOP)


with BuildPart() as f1_16:
    add(f1_15.part)

    # F13_t97: cut F13_tool98
    add(f13_tool98.part, mode=Mode.SUBTRACT)


with BuildPart() as f13_tool104:
    # F13_s105 → F13_t106 (new body)
    with BuildSketch(Plane.XY.offset(1.016)):
        with BuildLine():
            ThreePointArc((-19.304, 10.16), (-20.0224204897, 9.8624204897), (-20.32, 9.144))
            Line((-20.32, 9.144), (-20.32, 10.16))
            Line((-20.32, 10.16), (-19.304, 10.16))
        make_face()
    extrude(amount=F13_T106_DEPTH)

    split(bisect_by=Plane.XY.offset(26.67), keep=Keep.TOP)

    split(bisect_by=Plane.XZ.offset(-9.271), keep=Keep.BOTTOM)

    split(bisect_by=Plane.XY.offset(29.21), keep=Keep.BOTTOM)


with BuildPart() as f1_17:
    add(f1_16.part)

    # F13_t103: cut F13_tool104
    add(f13_tool104.part, mode=Mode.SUBTRACT)


with BuildPart() as f13_tool111:
    # F13_s112 → F13_t113 (new body)
    with BuildSketch(Plane.XY.offset(1.016)):
        with BuildLine():
            ThreePointArc((-19.304, 10.16), (-20.0224204897, 9.8624204897), (-20.32, 9.144))
            Line((-20.32, 9.144), (-20.32, 10.16))
            Line((-20.32, 10.16), (-19.304, 10.16))
        make_face()
    extrude(amount=F13_T113_DEPTH)

    split(bisect_by=Plane.XZ.offset(-9.271), keep=Keep.BOTTOM)

    split(bisect_by=Plane.XY.offset(29.21), keep=Keep.TOP)


with BuildPart() as f1_18:
    add(f1_17.part)

    # F13_t110: cut F13_tool111
    add(f13_tool111.part, mode=Mode.SUBTRACT)


with BuildPart() as f13_tool117:
    # F13_s118 → F13_t119 (new body)
    with BuildSketch(Plane.XY.offset(1.016)):
        with BuildLine():
            ThreePointArc((-19.304, 10.16), (-20.0224204897, 9.8624204897), (-20.32, 9.144))
            Line((-20.32, 9.144), (-20.32, 10.16))
            Line((-20.32, 10.16), (-19.304, 10.16))
        make_face()
    extrude(amount=F13_T119_DEPTH)

    split(bisect_by=Plane.XZ.offset(-9.271), keep=Keep.TOP)

    split(bisect_by=Plane.XY.offset(29.21), keep=Keep.TOP)


with BuildPart() as f1_19:
    add(f1_18.part)

    # F13_t116: cut F13_tool117
    add(f13_tool117.part, mode=Mode.SUBTRACT)


with BuildPart() as f13_tool123:
    # F13_s124 → F13_t125 (new body)
    with BuildSketch(Plane.XY.offset(1.016)):
        with BuildLine():
            ThreePointArc((-19.304, -10.16), (-20.0224204897, -9.8624204897), (-20.32, -9.144))
            Line((-20.32, -9.144), (-20.32, -10.16))
            Line((-20.32, -10.16), (-19.304, -10.16))
        make_face()
    extrude(amount=F13_T125_DEPTH)

    split(bisect_by=Plane.XZ.offset(9.271), keep=Keep.TOP)

    split(bisect_by=Plane.XY.offset(26.67), keep=Keep.BOTTOM)


with BuildPart() as f1_20:
    add(f1_19.part)

    # F13_t122: cut F13_tool123
    add(f13_tool123.part, mode=Mode.SUBTRACT)


with BuildPart() as f13_tool129:
    # F13_s130 → F13_t131 (new body)
    with BuildSketch(Plane.XY.offset(1.016)):
        with BuildLine():
            ThreePointArc((-19.304, -10.16), (-20.0224204897, -9.8624204897), (-20.32, -9.144))
            Line((-20.32, -9.144), (-20.32, -10.16))
            Line((-20.32, -10.16), (-19.304, -10.16))
        make_face()
    extrude(amount=F13_T131_DEPTH)

    split(bisect_by=Plane.XZ.offset(9.271), keep=Keep.BOTTOM)

    split(bisect_by=Plane.XY.offset(26.67), keep=Keep.BOTTOM)


with BuildPart() as f1_21:
    add(f1_20.part)

    # F13_t128: cut F13_tool129
    add(f13_tool129.part, mode=Mode.SUBTRACT)


with BuildPart() as f13_tool135:
    # F13_s136 → F13_t137 (new body)
    with BuildSketch(Plane.XY.offset(1.016)):
        with BuildLine():
            ThreePointArc((-19.304, -10.16), (-20.0224204897, -9.8624204897), (-20.32, -9.144))
            Line((-20.32, -9.144), (-20.32, -10.16))
            Line((-20.32, -10.16), (-19.304, -10.16))
        make_face()
    extrude(amount=F13_T137_DEPTH)

    split(bisect_by=Plane.XZ.offset(9.271), keep=Keep.TOP)

    split(bisect_by=Plane.XY.offset(26.67), keep=Keep.TOP)

    split(bisect_by=Plane.XY.offset(29.21), keep=Keep.BOTTOM)


with BuildPart() as f1_22:
    add(f1_21.part)

    # F13_t134: cut F13_tool135
    add(f13_tool135.part, mode=Mode.SUBTRACT)


with BuildPart() as f13_tool142:
    # F13_s143 → F13_t144 (new body)
    with BuildSketch(Plane.XY.offset(1.016)):
        with BuildLine():
            ThreePointArc((-19.304, -10.16), (-20.0224204897, -9.8624204897), (-20.32, -9.144))
            Line((-20.32, -9.144), (-20.32, -10.16))
            Line((-20.32, -10.16), (-19.304, -10.16))
        make_face()
    extrude(amount=F13_T144_DEPTH)

    split(bisect_by=Plane.XZ.offset(9.271), keep=Keep.TOP)

    split(bisect_by=Plane.XY.offset(29.21), keep=Keep.TOP)


with BuildPart() as f1_23:
    add(f1_22.part)

    # F13_t141: cut F13_tool142
    add(f13_tool142.part, mode=Mode.SUBTRACT)


with BuildPart() as f13_tool148:
    # F13_s149 → F13_t150 (new body)
    with BuildSketch(Plane.XY.offset(1.016)):
        with BuildLine():
            ThreePointArc((-19.304, -10.16), (-20.0224204897, -9.8624204897), (-20.32, -9.144))
            Line((-20.32, -9.144), (-20.32, -10.16))
            Line((-20.32, -10.16), (-19.304, -10.16))
        make_face()
    extrude(amount=F13_T150_DEPTH)

    split(bisect_by=Plane.XZ.offset(9.271), keep=Keep.BOTTOM)

    split(bisect_by=Plane.XY.offset(29.21), keep=Keep.TOP)


with BuildPart() as f1_24:
    add(f1_23.part)

    # F13_t147: cut F13_tool148
    add(f13_tool148.part, mode=Mode.SUBTRACT)

    # F14 (on face) → F15 (join)
    with BuildSketch(Plane.XY.offset(37.719)):
        with Locations((10.8458, 0)):
            Circle(F14_R)
        with Locations((10.8458, 0)):
            Circle(F14_R_2, mode=Mode.SUBTRACT)
    extrude(amount=F15_DEPTH)


solid = f1_24.part
